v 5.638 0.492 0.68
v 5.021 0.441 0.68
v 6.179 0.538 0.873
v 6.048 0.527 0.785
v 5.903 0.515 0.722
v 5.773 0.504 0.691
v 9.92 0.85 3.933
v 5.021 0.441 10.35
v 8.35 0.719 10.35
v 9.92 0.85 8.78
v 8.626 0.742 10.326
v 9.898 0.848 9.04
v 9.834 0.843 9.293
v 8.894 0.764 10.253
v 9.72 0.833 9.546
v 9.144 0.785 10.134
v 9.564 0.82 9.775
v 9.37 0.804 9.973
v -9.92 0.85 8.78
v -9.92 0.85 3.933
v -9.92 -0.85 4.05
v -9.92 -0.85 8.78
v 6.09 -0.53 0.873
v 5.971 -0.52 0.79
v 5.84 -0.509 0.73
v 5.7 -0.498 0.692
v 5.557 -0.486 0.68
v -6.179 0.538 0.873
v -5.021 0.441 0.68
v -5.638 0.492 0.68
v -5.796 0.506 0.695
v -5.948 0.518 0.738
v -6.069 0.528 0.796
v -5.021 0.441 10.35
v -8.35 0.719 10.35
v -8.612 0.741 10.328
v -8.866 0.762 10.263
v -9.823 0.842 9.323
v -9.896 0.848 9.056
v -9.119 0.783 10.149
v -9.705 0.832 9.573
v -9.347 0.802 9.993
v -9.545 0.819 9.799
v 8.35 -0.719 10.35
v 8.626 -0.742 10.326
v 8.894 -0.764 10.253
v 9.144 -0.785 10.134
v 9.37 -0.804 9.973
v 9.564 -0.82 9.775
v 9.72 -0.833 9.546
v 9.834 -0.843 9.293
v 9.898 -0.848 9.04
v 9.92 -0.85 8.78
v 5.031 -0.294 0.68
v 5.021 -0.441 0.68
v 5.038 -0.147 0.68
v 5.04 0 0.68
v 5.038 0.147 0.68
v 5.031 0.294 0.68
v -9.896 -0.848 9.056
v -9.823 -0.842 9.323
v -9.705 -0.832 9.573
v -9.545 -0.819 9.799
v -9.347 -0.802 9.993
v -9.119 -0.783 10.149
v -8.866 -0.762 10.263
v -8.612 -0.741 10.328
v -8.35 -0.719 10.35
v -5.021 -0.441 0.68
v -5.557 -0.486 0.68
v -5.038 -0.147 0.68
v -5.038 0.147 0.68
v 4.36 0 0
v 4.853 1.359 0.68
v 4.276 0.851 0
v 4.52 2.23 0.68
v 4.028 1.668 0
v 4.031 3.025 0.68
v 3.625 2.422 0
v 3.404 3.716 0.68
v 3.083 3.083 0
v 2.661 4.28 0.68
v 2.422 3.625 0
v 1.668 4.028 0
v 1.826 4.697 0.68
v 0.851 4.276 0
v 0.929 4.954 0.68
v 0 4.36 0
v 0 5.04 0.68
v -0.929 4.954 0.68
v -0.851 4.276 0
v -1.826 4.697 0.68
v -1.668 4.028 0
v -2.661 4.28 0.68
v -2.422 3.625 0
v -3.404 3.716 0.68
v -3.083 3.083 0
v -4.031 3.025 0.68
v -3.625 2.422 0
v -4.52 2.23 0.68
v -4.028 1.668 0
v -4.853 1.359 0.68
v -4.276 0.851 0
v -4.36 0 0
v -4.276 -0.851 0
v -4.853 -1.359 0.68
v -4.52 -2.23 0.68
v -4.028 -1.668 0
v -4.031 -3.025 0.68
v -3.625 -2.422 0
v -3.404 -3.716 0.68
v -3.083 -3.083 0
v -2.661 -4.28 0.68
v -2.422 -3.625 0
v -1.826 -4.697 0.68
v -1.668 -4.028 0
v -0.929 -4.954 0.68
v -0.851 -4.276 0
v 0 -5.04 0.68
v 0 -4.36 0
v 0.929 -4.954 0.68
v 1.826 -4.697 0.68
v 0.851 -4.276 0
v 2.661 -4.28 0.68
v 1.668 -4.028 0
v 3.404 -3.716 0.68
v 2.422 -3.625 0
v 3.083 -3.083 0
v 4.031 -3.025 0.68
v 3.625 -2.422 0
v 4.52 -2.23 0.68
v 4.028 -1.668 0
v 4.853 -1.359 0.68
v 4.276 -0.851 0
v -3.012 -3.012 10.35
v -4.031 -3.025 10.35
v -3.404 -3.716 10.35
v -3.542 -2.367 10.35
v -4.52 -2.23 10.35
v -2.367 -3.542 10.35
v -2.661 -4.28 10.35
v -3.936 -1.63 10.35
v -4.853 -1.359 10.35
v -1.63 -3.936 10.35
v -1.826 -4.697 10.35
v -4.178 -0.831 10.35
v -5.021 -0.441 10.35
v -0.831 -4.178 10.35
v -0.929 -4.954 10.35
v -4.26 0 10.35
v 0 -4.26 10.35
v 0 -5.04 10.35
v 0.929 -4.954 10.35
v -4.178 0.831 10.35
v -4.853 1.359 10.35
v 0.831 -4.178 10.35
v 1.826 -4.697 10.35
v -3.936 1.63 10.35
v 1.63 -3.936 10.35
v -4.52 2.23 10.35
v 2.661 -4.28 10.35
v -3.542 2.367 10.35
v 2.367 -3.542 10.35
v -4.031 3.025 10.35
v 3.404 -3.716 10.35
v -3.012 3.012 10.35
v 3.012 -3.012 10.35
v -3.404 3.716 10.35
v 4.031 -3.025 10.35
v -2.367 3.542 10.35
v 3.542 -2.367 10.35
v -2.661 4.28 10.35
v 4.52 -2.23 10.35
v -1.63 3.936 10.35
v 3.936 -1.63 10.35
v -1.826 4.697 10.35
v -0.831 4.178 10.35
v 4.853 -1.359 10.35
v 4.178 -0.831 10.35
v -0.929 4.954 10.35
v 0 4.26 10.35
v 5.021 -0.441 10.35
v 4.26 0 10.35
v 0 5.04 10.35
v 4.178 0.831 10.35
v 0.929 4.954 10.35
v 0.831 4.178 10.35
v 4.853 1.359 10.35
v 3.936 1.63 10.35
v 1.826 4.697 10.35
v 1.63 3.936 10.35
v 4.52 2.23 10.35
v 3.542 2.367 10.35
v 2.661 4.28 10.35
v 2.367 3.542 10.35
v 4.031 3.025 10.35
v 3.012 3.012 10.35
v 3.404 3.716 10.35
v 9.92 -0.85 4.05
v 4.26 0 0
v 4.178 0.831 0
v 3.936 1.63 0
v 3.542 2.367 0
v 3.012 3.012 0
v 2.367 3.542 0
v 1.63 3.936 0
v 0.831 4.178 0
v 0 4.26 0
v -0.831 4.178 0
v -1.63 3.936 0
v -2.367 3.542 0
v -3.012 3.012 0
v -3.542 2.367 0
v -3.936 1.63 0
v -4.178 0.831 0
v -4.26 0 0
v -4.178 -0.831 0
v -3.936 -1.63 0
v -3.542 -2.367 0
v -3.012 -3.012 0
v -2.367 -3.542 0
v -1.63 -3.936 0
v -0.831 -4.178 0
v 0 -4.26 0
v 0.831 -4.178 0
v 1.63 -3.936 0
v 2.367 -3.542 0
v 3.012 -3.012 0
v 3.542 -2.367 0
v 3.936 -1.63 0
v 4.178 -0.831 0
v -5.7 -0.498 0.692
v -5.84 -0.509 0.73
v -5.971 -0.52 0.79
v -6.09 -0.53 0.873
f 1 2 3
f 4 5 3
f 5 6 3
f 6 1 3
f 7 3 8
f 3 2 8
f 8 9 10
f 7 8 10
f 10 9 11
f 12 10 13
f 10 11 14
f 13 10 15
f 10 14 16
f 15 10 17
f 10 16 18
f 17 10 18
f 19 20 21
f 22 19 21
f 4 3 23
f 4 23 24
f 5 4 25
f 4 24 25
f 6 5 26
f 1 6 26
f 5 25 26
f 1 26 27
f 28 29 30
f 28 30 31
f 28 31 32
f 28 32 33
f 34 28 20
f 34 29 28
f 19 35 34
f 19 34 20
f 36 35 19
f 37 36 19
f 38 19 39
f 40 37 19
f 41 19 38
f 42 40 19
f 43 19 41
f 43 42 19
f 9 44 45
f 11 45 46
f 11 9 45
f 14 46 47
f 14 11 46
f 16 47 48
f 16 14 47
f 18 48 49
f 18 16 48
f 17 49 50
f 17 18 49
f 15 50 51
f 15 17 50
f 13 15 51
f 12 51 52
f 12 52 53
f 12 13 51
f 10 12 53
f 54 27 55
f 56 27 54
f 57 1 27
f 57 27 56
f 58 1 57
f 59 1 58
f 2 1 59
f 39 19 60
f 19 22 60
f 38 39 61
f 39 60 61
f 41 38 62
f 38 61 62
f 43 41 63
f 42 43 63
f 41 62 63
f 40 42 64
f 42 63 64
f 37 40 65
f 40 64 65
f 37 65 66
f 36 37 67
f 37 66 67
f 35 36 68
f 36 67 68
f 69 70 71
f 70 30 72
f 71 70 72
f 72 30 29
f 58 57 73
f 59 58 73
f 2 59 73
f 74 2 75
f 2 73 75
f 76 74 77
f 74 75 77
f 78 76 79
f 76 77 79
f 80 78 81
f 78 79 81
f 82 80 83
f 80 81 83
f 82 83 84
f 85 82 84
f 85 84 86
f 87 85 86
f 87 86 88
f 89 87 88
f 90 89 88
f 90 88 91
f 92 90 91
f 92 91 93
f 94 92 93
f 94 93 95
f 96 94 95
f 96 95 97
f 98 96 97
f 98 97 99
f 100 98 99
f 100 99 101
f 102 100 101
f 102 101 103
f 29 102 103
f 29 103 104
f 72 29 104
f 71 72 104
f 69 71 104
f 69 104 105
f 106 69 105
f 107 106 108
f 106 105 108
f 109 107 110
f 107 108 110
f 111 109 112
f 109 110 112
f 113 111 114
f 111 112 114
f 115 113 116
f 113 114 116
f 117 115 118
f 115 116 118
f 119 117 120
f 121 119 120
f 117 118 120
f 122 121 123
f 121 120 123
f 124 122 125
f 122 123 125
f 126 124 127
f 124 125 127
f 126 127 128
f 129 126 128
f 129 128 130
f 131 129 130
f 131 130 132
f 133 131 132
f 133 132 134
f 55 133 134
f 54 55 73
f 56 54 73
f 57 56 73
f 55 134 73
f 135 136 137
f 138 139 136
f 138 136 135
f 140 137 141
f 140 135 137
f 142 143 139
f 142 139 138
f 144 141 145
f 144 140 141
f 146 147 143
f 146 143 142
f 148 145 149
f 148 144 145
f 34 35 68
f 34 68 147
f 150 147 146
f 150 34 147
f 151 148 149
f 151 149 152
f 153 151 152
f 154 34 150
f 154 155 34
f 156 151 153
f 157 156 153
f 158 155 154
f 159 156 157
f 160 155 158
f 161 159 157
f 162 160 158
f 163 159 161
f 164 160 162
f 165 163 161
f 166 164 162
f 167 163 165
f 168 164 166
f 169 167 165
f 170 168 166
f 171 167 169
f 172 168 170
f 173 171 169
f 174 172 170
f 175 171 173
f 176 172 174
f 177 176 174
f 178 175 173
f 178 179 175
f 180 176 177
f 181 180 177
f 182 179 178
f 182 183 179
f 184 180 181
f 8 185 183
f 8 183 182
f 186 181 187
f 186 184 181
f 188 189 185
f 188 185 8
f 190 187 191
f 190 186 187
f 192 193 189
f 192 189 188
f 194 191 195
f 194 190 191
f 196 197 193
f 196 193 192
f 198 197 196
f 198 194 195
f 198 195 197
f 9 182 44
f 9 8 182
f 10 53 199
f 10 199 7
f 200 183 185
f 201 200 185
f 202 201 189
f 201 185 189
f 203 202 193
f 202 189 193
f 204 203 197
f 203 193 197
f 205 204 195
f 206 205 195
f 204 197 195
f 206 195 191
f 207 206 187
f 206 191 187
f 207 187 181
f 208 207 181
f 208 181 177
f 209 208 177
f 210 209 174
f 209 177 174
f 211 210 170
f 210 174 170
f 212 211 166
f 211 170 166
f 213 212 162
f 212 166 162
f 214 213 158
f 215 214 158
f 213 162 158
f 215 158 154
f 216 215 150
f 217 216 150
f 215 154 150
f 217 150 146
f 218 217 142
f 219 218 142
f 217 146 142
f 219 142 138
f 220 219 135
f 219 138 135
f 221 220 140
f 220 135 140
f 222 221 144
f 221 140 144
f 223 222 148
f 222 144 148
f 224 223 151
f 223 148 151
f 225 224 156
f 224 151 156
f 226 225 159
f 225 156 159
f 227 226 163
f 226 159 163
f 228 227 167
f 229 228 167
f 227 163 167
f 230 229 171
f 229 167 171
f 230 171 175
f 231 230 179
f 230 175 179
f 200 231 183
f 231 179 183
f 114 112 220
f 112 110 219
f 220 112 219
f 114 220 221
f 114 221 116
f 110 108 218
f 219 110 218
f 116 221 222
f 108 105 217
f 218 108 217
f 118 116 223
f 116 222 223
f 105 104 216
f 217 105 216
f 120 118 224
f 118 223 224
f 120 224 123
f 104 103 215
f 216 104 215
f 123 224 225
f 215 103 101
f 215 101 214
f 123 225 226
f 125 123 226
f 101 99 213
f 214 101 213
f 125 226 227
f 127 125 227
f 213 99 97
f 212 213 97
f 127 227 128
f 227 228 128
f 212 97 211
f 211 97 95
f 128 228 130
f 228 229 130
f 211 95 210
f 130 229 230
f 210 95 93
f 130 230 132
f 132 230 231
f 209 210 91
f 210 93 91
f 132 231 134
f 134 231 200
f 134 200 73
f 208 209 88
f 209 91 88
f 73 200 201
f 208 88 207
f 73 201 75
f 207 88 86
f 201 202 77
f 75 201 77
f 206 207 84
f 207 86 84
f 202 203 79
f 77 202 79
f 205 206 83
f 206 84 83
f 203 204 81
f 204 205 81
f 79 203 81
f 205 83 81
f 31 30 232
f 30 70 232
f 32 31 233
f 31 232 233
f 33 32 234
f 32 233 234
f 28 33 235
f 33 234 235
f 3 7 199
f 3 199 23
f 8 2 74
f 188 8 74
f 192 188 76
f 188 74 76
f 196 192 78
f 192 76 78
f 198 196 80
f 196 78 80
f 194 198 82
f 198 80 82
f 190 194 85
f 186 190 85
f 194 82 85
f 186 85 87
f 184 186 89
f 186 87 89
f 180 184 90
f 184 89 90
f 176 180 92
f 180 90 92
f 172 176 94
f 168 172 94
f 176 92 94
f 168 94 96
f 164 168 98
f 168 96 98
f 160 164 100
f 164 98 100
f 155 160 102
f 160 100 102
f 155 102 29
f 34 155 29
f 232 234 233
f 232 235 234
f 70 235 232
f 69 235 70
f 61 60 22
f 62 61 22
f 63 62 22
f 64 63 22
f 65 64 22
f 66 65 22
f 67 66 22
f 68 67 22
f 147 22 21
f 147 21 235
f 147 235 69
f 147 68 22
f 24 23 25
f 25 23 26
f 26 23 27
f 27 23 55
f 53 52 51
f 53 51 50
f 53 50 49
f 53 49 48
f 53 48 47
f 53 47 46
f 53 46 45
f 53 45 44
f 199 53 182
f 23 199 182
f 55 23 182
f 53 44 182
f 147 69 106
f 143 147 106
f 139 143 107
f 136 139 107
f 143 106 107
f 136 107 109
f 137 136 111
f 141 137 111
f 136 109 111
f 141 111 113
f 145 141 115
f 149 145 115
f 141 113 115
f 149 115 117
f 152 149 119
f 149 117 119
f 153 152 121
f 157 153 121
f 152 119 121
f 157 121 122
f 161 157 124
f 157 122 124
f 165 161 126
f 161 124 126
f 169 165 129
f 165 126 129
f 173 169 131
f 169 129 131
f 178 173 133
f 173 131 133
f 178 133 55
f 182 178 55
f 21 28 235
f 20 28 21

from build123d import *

# Parameters (mm, degrees)
IZIM1_R                     = 5.04
Y_KSEKLIK_EKSTR_ZYON1_DEPTH = 10.35
PAH1_SIZE                   = 0.68
IZIM2_R                     = 4.26
KES_EKSTR_ZYON1_DEPTH       = 10.35
Y_KSEKLIK_EKSTR_ZYON2_DEPTH = 9.67
KES_EKSTR_ZYON2_DEPTH       = 16.20471315
KES_EKSTR_ZYON2_DEPTH_BACK  = 16.20471315
KES_EKSTR_ZYON3_DEPTH       = 16.20471315
KES_EKSTR_ZYON3_DEPTH_BACK  = 16.20471315
RADYUS1_R                   = 0.84
RADYUS4_R                   = 0.84
RADYUS5_R                   = 1.57
RADYUS6_R                   = 1.57


with BuildPart() as part:
    # Çizim1 → Yükseklik-Ekstrüzyon1 (new body)
    with BuildSketch(Plane.XY):
        Circle(IZIM1_R)
    extrude(amount=Y_KSEKLIK_EKSTR_ZYON1_DEPTH)

    # Pah1
    pah1_edges = [part.edges().sort_by_distance(p)[0] for p in [
        (-5.04, 0, 0),
    ]]
    chamfer(pah1_edges, length=PAH1_SIZE)

    # Çizim2 → Kes-Ekstrüzyon1 (cut)
    with BuildSketch(Plane.XY.offset(10.35)):
        Circle(IZIM2_R)
    extrude(amount=-KES_EKSTR_ZYON1_DEPTH, mode=Mode.SUBTRACT)

    # Çizim3 → Yükseklik-Ekstrüzyon2 (add)
    with BuildSketch(Plane.XY.offset(10.35)):
        Polygon((5.01, 0.44), (9.92, 0.85), (9.92, 0), (9.92, -0.85), (5.01, -0.44), (5.01, 0), align=None)
        Polygon((-5.01, 0), (-5.01, 0.44), (-9.92, 0.85), (-9.92, 0), (-9.92, -0.85), (-5.01, -0.44), align=None)
    extrude(amount=-Y_KSEKLIK_EKSTR_ZYON2_DEPTH)

    # Çizim4 → Kes-Ekstrüzyon2 (cut, two sides: drawn at the far end of the back side and taken through both)
    with BuildSketch(Plane(origin=(0.001795297, -0.021499782, 0), x_dir=(-0.9965317468742466, -0.08321344525833854, 0), z_dir=(0.08321344525833854, -0.9965317468742466, 0)).offset(-KES_EKSTR_ZYON2_DEPTH_BACK)):
        Polygon((9.956326357, -0.68), (5.879953823, -0.68), (9.956326357, -4.05), align=None)
    extrude(amount=KES_EKSTR_ZYON2_DEPTH + KES_EKSTR_ZYON2_DEPTH_BACK, mode=Mode.SUBTRACT)

    # Çizim5 → Kes-Ekstrüzyon3 (cut, two sides: drawn at the far end of the back side and taken through both)
    with BuildSketch(Plane(origin=(-0.001795297, -0.021499782, 0), x_dir=(-0.9965317468742466, 0.08321344525833854, 0), z_dir=(-0.08321344525833854, -0.9965317468742466, 0)).offset(-KES_EKSTR_ZYON3_DEPTH_BACK)):
        Polygon((-9.956326357, -4.05), (-5.879953823, -0.68), (-9.956326357, -0.68), align=None)
    extrude(amount=KES_EKSTR_ZYON3_DEPTH + KES_EKSTR_ZYON3_DEPTH_BACK, mode=Mode.SUBTRACT)

    # Radyus1
    radyus1_edges = [part.edges().sort_by_distance(p)[0] for p in [
        (5.900717461, 0.003586632, 0.68),
    ]]
    fillet(radyus1_edges, radius=RADYUS1_R)

    # Radyus4
    radyus4_edges = [part.edges().sort_by_distance(p)[0] for p in [
        (-5.900717461, 0.003586632, 0.68),
    ]]
    fillet(radyus4_edges, radius=RADYUS4_R)

    # Radyus5
    radyus5_edges = [part.edges().sort_by_distance(p)[0] for p in [
        (-9.92, 0, 10.35),
    ]]
    fillet(radyus5_edges, radius=RADYUS5_R)

    # Radyus6
    radyus6_edges = [part.edges().sort_by_distance(p)[0] for p in [
        (9.92, 0, 10.35),
    ]]
    fillet(radyus6_edges, radius=RADYUS6_R)


solid = part.part
